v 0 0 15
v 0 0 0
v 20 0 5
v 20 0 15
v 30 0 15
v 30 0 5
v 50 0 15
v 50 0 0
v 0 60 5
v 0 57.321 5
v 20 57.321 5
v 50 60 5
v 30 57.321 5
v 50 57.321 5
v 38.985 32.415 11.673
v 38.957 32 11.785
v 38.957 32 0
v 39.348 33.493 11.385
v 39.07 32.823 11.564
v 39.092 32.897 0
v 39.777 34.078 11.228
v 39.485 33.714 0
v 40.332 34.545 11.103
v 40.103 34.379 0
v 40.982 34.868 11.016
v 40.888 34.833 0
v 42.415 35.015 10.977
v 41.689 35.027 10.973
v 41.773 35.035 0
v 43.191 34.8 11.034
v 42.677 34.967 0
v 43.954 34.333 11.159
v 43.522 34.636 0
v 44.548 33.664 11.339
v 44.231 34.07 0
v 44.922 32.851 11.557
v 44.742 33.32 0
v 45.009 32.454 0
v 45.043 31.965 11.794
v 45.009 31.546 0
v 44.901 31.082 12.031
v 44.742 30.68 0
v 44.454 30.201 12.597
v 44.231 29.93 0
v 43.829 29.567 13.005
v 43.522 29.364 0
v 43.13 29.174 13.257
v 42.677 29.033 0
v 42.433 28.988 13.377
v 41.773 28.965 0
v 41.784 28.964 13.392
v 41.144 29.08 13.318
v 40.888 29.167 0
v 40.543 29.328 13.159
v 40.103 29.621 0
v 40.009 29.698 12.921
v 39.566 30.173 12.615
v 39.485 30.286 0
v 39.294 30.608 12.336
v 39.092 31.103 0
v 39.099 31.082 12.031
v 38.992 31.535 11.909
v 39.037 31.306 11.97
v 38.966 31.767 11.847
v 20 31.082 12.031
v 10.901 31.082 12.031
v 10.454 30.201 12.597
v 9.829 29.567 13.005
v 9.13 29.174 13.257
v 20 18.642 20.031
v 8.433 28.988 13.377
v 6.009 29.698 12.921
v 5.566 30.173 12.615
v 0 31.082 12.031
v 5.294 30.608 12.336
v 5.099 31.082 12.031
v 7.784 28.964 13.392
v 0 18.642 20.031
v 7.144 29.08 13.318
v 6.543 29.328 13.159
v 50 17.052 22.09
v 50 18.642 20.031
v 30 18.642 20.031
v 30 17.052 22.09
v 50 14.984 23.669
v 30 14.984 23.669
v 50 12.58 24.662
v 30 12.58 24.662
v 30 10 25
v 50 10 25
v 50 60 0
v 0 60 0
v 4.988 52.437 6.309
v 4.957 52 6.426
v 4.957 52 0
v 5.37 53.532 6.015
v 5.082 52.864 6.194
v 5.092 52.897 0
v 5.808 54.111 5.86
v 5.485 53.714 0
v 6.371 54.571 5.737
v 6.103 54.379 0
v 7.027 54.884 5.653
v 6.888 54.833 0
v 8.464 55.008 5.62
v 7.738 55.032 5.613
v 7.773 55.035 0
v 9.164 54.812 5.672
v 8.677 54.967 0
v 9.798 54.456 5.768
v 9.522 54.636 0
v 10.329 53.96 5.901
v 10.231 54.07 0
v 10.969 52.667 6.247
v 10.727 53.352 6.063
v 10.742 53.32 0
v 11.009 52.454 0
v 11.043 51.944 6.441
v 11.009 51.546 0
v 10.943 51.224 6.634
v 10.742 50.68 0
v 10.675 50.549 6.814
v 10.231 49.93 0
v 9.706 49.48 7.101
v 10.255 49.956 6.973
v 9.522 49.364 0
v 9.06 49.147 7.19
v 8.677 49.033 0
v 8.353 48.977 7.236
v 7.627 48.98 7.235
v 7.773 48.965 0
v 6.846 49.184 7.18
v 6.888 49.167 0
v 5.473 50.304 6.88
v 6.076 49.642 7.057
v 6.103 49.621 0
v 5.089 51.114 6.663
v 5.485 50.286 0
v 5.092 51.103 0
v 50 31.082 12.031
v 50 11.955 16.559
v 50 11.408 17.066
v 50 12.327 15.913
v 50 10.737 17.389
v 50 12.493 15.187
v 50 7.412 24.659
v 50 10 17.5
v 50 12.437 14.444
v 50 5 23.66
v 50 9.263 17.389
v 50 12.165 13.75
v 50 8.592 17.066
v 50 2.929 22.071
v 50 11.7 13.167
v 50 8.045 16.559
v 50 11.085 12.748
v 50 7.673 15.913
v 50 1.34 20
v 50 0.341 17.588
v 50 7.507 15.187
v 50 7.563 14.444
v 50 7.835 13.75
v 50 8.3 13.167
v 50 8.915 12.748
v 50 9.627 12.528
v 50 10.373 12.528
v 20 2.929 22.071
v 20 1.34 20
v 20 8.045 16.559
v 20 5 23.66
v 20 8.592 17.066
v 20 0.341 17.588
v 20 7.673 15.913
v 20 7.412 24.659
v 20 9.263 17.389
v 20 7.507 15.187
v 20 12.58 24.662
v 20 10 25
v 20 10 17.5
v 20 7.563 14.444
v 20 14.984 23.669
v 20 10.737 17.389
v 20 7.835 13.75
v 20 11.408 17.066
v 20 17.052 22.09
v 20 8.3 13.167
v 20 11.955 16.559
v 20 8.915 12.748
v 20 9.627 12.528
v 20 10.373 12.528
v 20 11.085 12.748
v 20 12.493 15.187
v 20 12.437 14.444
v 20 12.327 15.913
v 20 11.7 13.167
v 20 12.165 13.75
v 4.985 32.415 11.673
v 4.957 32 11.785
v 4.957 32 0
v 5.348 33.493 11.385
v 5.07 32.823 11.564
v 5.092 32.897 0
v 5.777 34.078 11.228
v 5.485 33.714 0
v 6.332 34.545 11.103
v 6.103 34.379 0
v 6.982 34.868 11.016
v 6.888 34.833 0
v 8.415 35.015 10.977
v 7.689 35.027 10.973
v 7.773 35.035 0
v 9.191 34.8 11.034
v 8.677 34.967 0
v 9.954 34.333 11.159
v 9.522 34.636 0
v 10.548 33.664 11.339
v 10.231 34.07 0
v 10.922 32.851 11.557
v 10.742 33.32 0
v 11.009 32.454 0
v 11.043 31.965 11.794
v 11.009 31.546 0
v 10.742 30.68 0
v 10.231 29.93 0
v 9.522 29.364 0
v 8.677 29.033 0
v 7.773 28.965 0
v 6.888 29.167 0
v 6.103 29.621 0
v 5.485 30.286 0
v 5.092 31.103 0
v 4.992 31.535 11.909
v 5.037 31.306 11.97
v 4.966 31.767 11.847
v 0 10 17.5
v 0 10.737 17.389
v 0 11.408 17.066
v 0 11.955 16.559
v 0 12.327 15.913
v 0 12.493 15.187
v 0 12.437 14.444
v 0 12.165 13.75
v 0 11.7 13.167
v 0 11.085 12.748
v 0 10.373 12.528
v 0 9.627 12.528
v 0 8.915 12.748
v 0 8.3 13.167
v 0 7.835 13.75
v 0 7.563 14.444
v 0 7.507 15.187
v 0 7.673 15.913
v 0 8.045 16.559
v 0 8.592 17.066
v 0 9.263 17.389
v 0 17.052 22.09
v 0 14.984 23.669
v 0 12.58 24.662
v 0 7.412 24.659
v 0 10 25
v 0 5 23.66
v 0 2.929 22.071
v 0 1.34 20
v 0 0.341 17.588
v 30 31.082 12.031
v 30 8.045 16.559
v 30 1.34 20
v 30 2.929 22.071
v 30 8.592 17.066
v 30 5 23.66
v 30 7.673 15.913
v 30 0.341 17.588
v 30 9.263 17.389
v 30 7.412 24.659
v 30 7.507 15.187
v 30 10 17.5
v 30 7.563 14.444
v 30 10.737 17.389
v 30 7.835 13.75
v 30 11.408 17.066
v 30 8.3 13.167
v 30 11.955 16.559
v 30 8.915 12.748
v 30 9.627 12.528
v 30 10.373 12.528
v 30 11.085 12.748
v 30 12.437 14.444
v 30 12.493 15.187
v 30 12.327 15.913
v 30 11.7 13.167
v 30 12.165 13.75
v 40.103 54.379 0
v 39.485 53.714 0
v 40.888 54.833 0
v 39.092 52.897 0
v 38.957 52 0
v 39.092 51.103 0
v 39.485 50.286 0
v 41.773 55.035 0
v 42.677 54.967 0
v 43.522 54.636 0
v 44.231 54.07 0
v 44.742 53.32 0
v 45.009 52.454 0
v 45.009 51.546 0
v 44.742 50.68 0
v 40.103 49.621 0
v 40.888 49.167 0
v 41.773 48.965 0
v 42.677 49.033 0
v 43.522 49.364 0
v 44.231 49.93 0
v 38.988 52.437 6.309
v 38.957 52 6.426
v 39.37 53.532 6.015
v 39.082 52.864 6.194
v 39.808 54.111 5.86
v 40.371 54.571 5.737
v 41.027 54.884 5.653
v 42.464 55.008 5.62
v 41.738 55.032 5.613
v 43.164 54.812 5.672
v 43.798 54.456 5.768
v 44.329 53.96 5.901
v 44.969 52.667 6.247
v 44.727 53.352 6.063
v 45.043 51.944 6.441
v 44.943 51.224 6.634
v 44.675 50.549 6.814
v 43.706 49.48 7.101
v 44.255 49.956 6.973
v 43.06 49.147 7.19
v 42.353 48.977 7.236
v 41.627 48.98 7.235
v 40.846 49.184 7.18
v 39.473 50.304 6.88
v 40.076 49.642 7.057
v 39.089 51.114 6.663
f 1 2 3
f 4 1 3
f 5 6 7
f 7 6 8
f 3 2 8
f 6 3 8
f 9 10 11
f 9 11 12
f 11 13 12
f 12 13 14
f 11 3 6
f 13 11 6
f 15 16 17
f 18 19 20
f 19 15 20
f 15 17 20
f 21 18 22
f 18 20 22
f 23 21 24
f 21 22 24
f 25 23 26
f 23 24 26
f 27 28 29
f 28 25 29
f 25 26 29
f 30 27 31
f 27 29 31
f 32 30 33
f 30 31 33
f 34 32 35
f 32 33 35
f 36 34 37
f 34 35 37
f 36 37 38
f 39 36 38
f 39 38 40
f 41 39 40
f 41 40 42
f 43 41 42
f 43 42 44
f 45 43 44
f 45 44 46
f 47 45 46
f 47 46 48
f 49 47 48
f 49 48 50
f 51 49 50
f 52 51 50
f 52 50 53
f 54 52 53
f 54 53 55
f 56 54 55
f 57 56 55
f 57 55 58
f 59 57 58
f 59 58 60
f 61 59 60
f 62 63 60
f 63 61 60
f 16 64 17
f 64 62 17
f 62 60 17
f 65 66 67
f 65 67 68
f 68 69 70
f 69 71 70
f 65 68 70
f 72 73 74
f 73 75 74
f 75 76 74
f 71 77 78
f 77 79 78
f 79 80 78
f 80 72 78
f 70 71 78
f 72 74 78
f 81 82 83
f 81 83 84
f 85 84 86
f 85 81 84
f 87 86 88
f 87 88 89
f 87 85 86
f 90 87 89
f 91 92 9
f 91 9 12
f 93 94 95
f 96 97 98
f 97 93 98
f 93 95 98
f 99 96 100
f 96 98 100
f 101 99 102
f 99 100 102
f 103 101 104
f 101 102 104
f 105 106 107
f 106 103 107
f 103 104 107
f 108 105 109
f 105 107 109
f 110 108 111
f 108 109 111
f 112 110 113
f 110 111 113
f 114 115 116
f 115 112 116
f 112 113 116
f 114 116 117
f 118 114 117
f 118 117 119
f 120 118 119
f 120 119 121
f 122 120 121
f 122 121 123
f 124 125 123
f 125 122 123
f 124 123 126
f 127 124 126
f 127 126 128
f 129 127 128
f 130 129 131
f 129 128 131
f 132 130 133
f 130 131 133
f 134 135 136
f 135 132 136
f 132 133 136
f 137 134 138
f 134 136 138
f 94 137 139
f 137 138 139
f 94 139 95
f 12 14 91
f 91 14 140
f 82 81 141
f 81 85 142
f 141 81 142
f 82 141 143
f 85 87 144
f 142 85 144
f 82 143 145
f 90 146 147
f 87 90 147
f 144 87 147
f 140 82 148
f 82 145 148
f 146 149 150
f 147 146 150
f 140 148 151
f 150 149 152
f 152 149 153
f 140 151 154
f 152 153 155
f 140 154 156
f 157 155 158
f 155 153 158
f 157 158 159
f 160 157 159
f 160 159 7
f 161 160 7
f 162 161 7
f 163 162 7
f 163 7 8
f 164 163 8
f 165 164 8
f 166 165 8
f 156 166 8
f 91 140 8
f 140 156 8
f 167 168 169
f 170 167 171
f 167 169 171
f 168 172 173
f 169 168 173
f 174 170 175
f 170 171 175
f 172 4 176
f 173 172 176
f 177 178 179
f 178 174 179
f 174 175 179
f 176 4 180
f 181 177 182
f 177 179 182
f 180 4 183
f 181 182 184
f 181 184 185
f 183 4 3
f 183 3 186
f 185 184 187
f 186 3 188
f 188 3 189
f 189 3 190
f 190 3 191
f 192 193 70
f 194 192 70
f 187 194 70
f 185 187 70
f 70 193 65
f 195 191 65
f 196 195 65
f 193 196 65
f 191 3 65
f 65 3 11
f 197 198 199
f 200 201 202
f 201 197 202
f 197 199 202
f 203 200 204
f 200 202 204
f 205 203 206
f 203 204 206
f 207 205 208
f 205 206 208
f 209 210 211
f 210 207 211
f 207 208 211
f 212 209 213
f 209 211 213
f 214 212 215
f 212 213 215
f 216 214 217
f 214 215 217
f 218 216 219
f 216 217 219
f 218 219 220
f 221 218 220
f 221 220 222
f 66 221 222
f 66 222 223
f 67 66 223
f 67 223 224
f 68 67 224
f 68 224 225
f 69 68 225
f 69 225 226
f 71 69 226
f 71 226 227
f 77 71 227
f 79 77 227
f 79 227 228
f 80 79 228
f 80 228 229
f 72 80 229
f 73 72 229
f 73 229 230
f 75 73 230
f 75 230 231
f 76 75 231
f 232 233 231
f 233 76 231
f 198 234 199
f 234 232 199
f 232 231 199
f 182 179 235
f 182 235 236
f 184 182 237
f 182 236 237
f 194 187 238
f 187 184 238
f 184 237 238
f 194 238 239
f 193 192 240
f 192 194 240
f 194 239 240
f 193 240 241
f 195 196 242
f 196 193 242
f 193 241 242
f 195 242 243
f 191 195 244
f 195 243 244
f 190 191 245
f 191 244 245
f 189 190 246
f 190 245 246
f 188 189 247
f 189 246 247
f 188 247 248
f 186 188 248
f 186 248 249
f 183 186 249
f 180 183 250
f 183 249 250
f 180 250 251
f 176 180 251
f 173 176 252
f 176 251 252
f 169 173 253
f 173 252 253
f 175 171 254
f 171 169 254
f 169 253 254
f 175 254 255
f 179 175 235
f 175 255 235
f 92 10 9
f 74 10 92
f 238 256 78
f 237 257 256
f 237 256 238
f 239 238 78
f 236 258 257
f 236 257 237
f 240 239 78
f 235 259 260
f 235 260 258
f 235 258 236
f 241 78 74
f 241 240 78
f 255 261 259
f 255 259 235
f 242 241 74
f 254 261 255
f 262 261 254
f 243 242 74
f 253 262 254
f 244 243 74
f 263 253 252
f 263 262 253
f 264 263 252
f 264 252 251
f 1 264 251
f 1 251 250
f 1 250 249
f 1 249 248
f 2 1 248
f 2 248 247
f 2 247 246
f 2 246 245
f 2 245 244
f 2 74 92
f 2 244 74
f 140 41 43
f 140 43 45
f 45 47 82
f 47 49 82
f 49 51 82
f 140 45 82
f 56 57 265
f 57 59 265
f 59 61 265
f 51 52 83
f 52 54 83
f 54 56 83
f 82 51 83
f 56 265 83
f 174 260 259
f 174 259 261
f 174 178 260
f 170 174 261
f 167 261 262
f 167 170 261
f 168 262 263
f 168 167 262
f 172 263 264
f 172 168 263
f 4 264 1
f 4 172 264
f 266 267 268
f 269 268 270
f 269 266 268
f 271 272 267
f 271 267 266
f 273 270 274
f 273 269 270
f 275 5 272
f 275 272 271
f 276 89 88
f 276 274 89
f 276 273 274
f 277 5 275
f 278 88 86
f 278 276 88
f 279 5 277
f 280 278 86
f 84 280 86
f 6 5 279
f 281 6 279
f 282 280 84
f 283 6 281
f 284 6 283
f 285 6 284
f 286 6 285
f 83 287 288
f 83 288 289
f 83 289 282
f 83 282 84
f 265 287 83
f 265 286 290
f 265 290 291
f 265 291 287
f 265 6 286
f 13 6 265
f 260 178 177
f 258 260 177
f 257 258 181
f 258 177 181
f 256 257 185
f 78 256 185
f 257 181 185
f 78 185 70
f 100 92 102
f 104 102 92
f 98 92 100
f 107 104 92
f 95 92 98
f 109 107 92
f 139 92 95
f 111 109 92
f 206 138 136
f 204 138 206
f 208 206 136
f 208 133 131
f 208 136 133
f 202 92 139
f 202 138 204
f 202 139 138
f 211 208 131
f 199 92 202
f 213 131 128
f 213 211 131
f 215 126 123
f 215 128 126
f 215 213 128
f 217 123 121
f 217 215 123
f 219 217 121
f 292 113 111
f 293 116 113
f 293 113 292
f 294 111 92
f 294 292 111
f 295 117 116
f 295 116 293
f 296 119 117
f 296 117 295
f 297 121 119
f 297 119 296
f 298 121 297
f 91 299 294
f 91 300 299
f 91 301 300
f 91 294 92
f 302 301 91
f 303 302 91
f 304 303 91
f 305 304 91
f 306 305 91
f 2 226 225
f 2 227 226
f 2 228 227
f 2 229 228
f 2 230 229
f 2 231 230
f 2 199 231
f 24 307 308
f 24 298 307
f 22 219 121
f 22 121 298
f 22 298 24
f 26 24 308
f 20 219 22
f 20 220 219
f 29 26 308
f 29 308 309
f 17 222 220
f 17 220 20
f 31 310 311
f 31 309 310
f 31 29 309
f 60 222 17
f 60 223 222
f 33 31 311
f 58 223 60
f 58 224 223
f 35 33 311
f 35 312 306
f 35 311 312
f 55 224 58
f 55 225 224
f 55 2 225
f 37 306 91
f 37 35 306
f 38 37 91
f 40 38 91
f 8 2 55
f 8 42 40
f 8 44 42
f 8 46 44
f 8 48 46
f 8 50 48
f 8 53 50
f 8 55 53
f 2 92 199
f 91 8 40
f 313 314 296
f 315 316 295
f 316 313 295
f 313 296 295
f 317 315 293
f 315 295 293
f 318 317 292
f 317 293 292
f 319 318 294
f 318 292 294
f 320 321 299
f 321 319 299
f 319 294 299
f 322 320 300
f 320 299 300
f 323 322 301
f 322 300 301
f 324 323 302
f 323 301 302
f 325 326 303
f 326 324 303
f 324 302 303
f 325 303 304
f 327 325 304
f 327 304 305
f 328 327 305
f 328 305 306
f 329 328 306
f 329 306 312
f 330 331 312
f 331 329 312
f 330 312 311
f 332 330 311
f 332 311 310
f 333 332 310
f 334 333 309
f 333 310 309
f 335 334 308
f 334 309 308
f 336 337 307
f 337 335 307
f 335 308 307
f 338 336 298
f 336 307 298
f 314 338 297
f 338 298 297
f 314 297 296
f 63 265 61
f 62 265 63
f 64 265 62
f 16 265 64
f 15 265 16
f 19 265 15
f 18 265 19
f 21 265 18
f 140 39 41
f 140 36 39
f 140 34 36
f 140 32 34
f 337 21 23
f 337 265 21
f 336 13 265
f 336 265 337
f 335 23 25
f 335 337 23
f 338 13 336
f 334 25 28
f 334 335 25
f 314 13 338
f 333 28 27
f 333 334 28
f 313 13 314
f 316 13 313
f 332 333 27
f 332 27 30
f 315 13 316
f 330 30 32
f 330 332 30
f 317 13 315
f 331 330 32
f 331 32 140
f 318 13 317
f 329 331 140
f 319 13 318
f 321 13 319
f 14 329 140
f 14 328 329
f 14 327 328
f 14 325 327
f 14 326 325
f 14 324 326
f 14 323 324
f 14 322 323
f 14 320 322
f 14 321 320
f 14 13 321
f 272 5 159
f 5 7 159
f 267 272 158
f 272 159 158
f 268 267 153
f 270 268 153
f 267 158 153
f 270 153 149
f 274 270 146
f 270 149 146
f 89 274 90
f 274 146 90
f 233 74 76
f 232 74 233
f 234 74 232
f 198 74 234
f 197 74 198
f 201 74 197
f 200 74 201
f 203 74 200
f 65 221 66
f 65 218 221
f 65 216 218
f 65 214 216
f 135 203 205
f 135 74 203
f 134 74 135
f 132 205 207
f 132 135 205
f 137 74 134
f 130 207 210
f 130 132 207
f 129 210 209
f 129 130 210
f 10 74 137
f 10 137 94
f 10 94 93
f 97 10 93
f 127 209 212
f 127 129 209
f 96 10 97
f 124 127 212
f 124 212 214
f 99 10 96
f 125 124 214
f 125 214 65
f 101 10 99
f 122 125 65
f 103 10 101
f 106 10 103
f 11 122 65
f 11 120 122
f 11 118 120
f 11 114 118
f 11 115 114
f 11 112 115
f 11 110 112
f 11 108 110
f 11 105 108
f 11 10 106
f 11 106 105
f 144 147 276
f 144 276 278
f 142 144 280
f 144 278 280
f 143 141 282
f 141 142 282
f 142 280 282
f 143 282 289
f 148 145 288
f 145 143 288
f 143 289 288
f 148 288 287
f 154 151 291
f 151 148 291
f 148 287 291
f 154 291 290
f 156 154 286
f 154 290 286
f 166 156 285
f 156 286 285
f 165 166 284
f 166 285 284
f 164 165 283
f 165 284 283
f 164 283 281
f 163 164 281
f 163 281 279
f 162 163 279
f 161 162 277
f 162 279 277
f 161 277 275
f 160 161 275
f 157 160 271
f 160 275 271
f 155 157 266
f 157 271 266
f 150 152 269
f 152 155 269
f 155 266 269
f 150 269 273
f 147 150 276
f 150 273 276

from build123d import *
from OCP.BRepFilletAPI import BRepFilletAPI_MakeChamfer

# Parameters (mm, degrees)
SZKIC1_W                    = 50
SZKIC1_H                    = 20
DODANIE_WYCI_GNI_CIE1_DEPTH = 5
SZKIC2_W                    = 20
SZKIC2_H                    = 20
DODANIE_WYCI_GNI_CIE2_DEPTH = 20
SZKIC3_R                    = 2.5
WYTNIJ_WYCI_GNI_CIE1_DEPTH  = 60.371710435
ZAOKR_GLENIE1_R             = 10
SZKIC4_W                    = 50
SZKIC4_H                    = 5
DODANIE_WYCI_GNI_CIE3_DEPTH = 40
SFAZOWANIE1_SIZE            = 10
SFAZOWANIE1_SIZE2           = 37.320508076
SFAZOWANIE2_OUTLINE_R       = 2.5
SFAZOWANIE2_DEPTH           = 20
SFAZOWANIE2_START           = 30
SFAZOWANIE2_2_OUTLINE_R     = 2.5
SFAZOWANIE2_2_DEPTH         = 20
SZKIC5_R                    = 3.043345969
WYTNIJ_WYCI_GNI_CIE2_DEPTH  = 83.006097334


with BuildPart() as part:
    # Szkic1 → Dodanie-wyciągnięcie1 (new body)
    with BuildSketch(Plane.XY):
        with Locations((25, 10)):
            Rectangle(SZKIC1_W, SZKIC1_H)
    extrude(amount=DODANIE_WYCI_GNI_CIE1_DEPTH)

    # Szkic2 → Dodanie-wyciągnięcie2 (add)
    with BuildSketch(Plane.XY.offset(5)):
        with Locations((10, 10)):
            Rectangle(SZKIC2_W, SZKIC2_H)
        with Locations((40, 10)):
            Rectangle(SZKIC2_W, SZKIC2_H)
    extrude(amount=DODANIE_WYCI_GNI_CIE2_DEPTH)

    # Szkic3 → Wytnij-wyciągnięcie1 (cut, through all)
    with BuildSketch(Plane.ZY):
        with Locations((15, 10)):
            Circle(SZKIC3_R)
    extrude(amount=-WYTNIJ_WYCI_GNI_CIE1_DEPTH, mode=Mode.SUBTRACT)

    # Zaokrąglenie1
    zaokr_glenie1_edges = [part.edges().sort_by_distance(p)[0] for p in [
        (40, 20, 25),
        (40, 0, 25),
        (10, 0, 25),
        (10, 20, 25),
    ]]
    fillet(zaokr_glenie1_edges, radius=ZAOKR_GLENIE1_R - 0.0001)  # a hair under: the kernel refuses the full size

    # Szkic4 → Dodanie-wyciągnięcie3 (add)
    with BuildSketch(Plane(origin=(0, 20, 0), x_dir=(1, 0, 0), z_dir=(0, 1, 0))):
        with Locations((25, -2.5)):
            Rectangle(SZKIC4_W, SZKIC4_H)
    extrude(amount=DODANIE_WYCI_GNI_CIE3_DEPTH)

    # Sfazowanie1: one chamfer whose edges measure the first distance from different faces: ONE call of the kernel's chamfer builder (chamfer() names one face for all edges)
    sfazowanie1_edges_1 = [part.edges().sort_by_distance(p)[0] for p in [
        (40, 20, 5),
    ]]
    sfazowanie1_side_1 = [part.faces().sort_by_distance(p)[0] for p in [
        (40, 20, 10.00005),
    ]]
    sfazowanie1_edges_2 = [part.edges().sort_by_distance(p)[0] for p in [
        (10, 20, 5),
    ]]
    sfazowanie1_side_2 = [part.faces().sort_by_distance(p)[0] for p in [
        (10, 20, 10.00005),
    ]]
    sfazowanie1 = BRepFilletAPI_MakeChamfer(part.part.solid().wrapped)
    for e in sfazowanie1_edges_1:
        sfazowanie1.Add(SFAZOWANIE1_SIZE, SFAZOWANIE1_SIZE2, e.wrapped, sfazowanie1_side_1[0].wrapped)  # the first distance lies on this face
    for e in sfazowanie1_edges_2:
        sfazowanie1.Add(SFAZOWANIE1_SIZE, SFAZOWANIE1_SIZE2, e.wrapped, sfazowanie1_side_2[0].wrapped)  # the first distance lies on this face
    add(Compound.cast(sfazowanie1.Shape()), mode=Mode.REPLACE)

    # Sfazowanie2: read off the stored shape, not the designer's step
    # Sfazowanie2 outline → Sfazowanie2 (add)
    with BuildSketch(Plane.YZ):
        with BuildLine():
            Line((0, 15), (0, 0))
            Line((0, 0), (60, 0))
            Line((60, 0), (60, 5))
            Line((60, 5), (57.320508076, 5))
            Line((57.320508076, 5), (31.081570656, 12.030702092))
            Line((31.081570656, 12.030702092), (18.642014143, 20.031460181))
            ThreePointArc((18.642014143, 20.031460181), (7.394250725, 24.654536276), (0, 15))
        make_face()
        with Locations((10, 15)):
            Circle(SFAZOWANIE2_OUTLINE_R, mode=Mode.SUBTRACT)
    extrude(amount=SFAZOWANIE2_DEPTH)

    # Sfazowanie2 2 outline → Sfazowanie2 2 (add)
    with BuildSketch(Plane.YZ.offset(SFAZOWANIE2_START)):
        with BuildLine():
            Line((0, 15), (0, 0))
            Line((0, 0), (60, 0))
            Line((60, 0), (60, 5))
            Line((60, 5), (57.320508076, 5))
            Line((57.320508076, 5), (31.081570656, 12.030702092))
            Line((31.081570656, 12.030702092), (18.642014143, 20.031460181))
            ThreePointArc((18.642014143, 20.031460181), (7.394250725, 24.654536276), (0, 15))
        make_face()
        with Locations((10, 15)):
            Circle(SFAZOWANIE2_2_OUTLINE_R, mode=Mode.SUBTRACT)
    extrude(amount=SFAZOWANIE2_2_DEPTH)

    # Szkic5 → Wytnij-wyciągnięcie2 (cut, through all)
    with BuildSketch(Plane(origin=(0, 0, 0), x_dir=(-1, 0, 0), z_dir=(0, 0, -1))):
        with Locations((-42, 52)):
            Circle(SZKIC5_R)
        with Locations((-8, 52)):
            Circle(SZKIC5_R)
        with Locations((-8, 32)):
            Circle(SZKIC5_R)
        with Locations((-42, 32)):
            Circle(SZKIC5_R)
    extrude(amount=-WYTNIJ_WYCI_GNI_CIE2_DEPTH, mode=Mode.SUBTRACT)


solid = part.part
